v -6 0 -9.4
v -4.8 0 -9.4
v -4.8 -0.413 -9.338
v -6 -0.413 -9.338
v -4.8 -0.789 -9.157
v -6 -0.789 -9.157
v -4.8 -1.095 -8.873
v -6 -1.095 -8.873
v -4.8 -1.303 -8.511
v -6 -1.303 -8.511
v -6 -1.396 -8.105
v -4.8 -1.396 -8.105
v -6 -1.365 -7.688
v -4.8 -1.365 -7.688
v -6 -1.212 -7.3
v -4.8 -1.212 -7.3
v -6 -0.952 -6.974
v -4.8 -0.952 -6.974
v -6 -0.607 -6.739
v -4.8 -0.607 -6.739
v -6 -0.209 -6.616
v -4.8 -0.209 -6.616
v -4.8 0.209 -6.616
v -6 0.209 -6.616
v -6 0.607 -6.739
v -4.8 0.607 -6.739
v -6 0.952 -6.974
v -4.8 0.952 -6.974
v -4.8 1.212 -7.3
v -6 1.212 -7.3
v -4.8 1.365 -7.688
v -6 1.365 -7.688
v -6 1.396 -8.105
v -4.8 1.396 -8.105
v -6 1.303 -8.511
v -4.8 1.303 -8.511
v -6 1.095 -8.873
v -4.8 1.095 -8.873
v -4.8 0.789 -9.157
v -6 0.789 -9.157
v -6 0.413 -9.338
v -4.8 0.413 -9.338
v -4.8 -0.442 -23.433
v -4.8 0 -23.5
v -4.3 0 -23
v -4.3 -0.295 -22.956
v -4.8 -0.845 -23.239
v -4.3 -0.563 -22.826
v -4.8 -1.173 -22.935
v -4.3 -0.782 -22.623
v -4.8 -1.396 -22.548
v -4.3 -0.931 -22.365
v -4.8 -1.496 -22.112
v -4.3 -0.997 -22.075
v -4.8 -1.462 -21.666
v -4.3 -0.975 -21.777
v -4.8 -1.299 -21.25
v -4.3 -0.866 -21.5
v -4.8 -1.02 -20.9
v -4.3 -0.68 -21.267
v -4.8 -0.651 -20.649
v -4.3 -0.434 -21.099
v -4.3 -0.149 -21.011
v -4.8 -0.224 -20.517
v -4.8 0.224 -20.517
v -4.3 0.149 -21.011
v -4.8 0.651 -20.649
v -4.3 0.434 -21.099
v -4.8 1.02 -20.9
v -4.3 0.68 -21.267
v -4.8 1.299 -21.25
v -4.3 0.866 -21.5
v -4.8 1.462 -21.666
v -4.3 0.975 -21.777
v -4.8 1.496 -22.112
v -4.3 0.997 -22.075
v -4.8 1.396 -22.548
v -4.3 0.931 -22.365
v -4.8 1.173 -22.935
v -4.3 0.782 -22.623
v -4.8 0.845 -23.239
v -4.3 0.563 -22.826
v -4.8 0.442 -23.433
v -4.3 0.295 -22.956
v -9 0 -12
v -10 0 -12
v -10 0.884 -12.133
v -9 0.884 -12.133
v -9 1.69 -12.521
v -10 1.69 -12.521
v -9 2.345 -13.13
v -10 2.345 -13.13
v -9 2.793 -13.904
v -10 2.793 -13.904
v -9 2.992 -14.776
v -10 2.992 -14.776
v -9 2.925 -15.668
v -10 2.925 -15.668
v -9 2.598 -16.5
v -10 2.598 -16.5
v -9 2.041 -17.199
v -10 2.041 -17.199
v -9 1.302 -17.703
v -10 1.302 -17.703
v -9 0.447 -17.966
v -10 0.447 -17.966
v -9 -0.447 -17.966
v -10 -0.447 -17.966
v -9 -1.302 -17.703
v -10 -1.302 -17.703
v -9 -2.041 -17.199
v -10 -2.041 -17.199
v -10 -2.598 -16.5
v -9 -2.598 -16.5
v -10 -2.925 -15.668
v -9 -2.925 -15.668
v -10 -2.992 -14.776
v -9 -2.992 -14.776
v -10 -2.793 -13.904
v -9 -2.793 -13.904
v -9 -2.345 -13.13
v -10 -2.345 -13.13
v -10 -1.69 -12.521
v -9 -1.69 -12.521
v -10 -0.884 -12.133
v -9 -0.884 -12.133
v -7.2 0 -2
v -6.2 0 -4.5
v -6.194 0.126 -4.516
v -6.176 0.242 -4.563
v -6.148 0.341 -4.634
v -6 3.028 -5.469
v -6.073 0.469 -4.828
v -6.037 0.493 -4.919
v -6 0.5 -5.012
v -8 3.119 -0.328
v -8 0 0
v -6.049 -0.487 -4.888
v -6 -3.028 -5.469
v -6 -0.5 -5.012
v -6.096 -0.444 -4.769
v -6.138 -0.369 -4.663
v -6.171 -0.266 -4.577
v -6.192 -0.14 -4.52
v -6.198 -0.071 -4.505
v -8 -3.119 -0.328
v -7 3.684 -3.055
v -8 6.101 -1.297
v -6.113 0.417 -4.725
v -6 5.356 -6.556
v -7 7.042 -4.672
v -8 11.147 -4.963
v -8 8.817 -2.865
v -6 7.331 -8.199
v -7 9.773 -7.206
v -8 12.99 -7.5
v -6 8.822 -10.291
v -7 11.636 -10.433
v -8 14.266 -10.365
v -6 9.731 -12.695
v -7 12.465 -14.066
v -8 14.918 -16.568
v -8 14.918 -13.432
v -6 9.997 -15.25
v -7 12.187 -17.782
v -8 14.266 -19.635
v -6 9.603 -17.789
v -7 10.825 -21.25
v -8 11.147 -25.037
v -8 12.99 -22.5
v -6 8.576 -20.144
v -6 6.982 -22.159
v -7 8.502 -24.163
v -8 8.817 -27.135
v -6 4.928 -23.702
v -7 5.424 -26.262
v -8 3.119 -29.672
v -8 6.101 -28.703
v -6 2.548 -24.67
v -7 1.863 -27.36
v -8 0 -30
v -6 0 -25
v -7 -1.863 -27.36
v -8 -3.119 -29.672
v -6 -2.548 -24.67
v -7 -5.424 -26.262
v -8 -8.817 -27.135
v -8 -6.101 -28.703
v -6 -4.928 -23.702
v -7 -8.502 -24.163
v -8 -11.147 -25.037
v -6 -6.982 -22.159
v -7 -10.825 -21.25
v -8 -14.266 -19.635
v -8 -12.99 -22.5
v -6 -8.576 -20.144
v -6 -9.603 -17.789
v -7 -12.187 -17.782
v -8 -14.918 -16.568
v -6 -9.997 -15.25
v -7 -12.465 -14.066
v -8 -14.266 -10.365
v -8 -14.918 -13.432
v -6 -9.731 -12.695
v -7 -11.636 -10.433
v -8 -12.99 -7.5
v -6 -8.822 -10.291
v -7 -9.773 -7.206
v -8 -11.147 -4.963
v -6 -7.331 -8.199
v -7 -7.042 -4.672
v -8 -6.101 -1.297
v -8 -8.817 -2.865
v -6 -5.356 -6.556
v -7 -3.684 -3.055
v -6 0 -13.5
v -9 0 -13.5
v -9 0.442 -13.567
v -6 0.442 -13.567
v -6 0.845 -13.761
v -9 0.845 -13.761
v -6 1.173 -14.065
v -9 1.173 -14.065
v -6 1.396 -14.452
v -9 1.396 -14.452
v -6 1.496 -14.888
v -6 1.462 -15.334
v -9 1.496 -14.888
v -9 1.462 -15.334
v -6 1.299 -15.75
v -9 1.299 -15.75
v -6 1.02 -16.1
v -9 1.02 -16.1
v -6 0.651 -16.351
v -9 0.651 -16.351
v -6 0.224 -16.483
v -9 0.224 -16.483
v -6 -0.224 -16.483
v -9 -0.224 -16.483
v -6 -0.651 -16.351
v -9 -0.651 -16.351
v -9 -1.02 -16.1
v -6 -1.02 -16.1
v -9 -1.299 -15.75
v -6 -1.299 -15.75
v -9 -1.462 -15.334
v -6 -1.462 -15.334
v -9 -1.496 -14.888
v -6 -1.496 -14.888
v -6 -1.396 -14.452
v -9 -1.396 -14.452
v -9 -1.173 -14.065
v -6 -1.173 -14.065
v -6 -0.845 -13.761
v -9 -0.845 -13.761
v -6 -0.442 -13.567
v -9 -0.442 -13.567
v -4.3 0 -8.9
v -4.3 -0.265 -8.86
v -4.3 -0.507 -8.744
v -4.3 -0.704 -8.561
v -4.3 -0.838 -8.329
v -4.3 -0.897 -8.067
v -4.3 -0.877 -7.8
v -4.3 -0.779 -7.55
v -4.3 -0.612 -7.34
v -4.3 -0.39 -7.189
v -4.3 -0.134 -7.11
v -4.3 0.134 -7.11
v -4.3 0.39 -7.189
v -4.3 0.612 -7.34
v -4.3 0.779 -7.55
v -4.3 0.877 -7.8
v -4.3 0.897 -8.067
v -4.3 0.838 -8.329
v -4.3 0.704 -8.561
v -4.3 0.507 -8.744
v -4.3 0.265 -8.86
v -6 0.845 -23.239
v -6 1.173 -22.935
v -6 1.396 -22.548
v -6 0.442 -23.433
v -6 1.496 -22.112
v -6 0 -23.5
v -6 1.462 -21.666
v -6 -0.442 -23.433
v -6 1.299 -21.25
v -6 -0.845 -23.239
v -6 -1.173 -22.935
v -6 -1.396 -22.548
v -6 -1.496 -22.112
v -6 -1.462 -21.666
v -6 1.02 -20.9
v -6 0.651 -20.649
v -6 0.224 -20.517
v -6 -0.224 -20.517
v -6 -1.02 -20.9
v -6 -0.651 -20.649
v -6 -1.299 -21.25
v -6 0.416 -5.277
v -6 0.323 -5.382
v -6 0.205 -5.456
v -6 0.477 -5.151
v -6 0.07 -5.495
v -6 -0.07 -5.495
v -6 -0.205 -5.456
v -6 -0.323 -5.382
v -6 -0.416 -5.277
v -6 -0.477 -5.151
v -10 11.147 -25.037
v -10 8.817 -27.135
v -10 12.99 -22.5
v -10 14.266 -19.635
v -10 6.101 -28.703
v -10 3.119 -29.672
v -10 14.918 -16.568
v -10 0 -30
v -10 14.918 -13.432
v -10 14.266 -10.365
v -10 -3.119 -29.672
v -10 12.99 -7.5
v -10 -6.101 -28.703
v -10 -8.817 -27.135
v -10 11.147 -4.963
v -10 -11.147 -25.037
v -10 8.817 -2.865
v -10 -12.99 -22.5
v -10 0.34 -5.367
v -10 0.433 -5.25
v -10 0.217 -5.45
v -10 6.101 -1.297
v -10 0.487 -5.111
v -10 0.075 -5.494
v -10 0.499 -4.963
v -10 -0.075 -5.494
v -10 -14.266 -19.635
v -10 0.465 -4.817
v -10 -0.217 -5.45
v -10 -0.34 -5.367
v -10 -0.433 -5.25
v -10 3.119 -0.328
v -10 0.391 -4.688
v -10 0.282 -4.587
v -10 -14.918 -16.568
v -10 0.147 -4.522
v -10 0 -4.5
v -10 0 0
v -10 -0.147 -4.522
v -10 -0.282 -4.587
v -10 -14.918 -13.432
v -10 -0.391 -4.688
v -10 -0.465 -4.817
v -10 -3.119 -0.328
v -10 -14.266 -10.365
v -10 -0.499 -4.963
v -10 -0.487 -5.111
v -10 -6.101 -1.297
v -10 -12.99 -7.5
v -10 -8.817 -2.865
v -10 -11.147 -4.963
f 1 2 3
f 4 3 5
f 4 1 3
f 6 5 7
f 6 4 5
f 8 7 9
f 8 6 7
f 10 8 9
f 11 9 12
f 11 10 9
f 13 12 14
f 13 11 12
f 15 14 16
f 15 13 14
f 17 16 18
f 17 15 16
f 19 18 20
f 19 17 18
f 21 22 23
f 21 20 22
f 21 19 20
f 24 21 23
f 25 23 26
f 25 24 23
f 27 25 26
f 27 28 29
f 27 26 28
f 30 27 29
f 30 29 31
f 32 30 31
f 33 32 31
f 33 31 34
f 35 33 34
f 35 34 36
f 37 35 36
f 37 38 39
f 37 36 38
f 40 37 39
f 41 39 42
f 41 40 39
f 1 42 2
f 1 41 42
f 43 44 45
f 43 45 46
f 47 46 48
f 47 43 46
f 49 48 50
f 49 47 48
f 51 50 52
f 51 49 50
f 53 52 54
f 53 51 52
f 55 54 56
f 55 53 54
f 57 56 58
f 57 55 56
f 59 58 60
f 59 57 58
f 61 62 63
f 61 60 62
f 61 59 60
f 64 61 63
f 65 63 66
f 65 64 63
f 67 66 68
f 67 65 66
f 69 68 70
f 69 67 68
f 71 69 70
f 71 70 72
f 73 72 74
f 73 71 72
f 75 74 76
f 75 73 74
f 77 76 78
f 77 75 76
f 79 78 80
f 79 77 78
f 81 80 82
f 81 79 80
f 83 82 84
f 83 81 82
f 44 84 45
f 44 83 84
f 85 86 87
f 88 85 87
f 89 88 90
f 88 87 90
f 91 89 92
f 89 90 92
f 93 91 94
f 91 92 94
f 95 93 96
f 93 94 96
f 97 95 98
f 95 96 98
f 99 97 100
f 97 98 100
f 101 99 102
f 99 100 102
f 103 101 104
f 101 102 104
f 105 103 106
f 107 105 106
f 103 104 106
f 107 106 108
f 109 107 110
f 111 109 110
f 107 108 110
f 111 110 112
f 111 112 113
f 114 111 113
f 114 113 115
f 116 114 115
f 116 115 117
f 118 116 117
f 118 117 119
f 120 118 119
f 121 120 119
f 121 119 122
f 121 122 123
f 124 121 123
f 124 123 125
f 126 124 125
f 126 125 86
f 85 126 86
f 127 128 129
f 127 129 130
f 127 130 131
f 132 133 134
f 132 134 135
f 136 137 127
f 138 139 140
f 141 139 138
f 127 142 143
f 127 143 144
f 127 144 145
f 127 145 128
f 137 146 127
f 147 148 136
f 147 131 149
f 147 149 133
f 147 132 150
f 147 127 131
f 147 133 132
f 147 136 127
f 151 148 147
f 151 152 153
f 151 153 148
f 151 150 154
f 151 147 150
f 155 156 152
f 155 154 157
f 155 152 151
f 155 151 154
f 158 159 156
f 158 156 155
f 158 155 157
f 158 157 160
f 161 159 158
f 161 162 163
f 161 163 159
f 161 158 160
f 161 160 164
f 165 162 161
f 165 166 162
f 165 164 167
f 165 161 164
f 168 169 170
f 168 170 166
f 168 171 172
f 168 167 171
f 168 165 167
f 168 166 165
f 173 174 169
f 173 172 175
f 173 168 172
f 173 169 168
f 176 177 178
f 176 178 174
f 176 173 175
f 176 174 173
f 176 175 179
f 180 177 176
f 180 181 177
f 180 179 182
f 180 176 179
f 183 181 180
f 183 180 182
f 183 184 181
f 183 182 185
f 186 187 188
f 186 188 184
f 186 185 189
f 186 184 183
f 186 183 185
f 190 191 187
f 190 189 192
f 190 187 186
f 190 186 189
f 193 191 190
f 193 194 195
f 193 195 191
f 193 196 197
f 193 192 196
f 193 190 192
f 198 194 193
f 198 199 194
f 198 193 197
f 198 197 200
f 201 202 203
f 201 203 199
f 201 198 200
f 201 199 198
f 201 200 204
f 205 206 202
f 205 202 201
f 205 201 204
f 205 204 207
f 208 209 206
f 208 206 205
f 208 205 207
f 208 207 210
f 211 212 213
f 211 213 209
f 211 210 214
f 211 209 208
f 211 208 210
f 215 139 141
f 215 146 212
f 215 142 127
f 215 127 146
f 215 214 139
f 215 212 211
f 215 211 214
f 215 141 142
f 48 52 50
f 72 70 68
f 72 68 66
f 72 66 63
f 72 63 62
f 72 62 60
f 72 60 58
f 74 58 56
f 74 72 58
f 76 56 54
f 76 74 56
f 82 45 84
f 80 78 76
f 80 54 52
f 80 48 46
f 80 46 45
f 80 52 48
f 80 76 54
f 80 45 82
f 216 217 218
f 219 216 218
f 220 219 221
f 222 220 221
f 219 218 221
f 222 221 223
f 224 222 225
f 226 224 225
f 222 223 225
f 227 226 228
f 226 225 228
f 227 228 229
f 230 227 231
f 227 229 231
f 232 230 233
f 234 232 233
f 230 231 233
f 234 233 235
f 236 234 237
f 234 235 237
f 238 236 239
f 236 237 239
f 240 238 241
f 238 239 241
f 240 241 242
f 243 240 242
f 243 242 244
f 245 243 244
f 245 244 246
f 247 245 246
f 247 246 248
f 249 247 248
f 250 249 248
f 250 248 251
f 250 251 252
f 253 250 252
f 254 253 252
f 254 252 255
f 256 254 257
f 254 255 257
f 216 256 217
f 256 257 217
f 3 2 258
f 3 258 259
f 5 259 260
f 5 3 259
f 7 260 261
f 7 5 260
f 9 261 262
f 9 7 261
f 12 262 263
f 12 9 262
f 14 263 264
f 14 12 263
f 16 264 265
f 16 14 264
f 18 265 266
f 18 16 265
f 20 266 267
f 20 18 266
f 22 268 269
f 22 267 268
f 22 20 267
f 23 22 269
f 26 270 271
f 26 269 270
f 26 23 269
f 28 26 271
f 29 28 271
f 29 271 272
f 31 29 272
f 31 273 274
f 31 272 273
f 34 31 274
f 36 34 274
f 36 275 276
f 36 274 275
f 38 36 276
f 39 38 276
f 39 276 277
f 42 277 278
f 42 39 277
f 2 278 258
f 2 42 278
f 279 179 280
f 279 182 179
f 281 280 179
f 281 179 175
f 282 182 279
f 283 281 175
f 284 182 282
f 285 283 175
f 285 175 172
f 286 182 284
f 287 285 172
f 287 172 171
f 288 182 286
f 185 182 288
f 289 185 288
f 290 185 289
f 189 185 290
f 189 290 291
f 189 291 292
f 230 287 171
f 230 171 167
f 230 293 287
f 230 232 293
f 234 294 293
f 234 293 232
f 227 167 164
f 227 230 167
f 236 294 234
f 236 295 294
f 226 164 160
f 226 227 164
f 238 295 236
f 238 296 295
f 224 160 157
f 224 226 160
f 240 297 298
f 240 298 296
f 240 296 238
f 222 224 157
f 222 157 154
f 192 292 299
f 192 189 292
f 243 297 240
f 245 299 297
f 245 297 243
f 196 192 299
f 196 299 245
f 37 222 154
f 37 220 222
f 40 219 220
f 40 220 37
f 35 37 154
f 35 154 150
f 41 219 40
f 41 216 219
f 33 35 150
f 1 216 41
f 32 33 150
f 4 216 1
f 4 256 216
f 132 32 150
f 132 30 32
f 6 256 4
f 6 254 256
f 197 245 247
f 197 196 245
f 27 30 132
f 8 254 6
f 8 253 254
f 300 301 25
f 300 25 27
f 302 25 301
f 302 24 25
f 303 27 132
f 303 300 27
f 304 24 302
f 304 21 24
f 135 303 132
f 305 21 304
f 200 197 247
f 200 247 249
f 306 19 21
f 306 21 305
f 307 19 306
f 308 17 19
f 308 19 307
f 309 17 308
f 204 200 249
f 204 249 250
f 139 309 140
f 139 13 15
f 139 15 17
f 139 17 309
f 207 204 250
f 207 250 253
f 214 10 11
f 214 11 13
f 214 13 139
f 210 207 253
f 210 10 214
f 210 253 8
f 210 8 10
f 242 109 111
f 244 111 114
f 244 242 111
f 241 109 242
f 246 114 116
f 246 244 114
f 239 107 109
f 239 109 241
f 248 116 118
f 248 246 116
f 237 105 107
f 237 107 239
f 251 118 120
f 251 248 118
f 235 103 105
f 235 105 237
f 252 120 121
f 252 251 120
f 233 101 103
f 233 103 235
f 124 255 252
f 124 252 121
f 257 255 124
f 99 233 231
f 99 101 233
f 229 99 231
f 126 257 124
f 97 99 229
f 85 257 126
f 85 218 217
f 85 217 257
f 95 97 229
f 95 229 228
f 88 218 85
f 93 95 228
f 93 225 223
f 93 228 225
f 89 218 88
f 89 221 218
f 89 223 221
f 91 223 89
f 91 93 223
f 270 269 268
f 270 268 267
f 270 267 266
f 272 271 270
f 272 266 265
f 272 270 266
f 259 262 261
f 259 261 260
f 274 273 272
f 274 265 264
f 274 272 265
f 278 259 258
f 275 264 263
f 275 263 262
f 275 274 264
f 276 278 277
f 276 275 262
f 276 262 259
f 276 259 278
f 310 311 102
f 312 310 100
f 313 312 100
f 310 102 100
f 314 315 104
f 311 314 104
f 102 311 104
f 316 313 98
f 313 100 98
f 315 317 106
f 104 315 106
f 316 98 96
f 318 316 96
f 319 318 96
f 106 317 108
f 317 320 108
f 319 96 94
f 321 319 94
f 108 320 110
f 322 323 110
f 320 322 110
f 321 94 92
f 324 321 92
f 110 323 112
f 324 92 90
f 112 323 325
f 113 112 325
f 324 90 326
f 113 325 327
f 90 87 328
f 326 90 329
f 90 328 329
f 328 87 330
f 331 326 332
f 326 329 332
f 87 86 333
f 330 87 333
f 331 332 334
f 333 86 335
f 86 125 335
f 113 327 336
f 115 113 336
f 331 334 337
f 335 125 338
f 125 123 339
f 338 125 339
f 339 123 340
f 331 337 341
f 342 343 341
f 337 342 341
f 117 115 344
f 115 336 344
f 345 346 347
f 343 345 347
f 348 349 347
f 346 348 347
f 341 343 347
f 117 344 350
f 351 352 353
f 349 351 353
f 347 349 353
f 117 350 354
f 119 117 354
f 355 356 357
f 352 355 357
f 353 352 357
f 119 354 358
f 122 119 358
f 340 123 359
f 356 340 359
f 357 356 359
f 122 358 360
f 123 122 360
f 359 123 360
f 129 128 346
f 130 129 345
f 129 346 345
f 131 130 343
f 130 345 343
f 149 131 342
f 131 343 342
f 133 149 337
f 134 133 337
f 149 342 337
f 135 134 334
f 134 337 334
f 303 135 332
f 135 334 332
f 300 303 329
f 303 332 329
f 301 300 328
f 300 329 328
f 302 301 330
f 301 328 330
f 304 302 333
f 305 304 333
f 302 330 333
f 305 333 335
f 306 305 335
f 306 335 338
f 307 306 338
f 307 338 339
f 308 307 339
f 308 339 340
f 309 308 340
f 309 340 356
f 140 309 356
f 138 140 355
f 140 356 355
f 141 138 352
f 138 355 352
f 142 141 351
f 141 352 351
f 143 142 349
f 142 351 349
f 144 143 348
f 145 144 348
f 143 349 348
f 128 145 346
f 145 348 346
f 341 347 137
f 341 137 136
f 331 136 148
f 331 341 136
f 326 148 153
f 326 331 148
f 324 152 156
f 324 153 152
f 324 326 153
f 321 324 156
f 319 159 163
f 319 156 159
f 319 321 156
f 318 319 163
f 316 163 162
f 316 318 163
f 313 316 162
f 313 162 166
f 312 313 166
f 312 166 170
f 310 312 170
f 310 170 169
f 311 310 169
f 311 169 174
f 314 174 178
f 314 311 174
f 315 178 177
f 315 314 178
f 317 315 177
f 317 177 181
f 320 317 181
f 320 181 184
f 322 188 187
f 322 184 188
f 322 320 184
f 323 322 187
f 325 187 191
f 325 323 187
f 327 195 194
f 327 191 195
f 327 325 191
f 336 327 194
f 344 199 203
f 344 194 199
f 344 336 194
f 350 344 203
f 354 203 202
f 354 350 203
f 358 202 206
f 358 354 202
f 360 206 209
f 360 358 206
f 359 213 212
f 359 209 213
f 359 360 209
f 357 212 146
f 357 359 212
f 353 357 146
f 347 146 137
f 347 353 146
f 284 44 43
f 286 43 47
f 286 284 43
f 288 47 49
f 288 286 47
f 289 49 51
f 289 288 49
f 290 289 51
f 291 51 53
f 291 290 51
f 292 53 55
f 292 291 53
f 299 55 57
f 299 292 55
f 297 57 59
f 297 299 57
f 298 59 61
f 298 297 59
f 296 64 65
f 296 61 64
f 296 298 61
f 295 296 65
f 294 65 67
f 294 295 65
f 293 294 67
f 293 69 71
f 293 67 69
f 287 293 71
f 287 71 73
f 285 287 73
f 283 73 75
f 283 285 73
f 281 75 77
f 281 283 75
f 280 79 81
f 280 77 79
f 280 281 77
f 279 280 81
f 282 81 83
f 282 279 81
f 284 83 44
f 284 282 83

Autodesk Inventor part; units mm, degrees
ref_plane "YZ Plane" through (0, 0, 0) normal (1, 0, 0) x (0, 1, 0)
ref_plane "XZ Plane" through (0, 0, 0) normal (0, 1, 0) x (-1, 0, 0)
ref_plane "XY Plane" through (0, 0, 0) normal (0, 0, 1) x (1, 0, 0)
sketch "Náčrt1" plane through (0, 0, 0) normal (0, 1, 0) x (-1, 0, 0)
  line L0 (0, 0) -> (0, -15)
  line L1 (10, 0) -> (10, -15)
  line L2 (6, -5) -> (4, -5)
  line L3 (10, -15) -> (0, -15)
  line L4 (6, -5) -> (8, 0)
  line L5 (8, 0) -> (10, 0)
  line L6 (4, -5) -> (2, 0)
  line L7 (2, 0) -> (0, 0)
  dimension "d0" = 2
  dimension "d1" = 5
  dimension "d2" = 15
  dimension "d5" = 2
  dimension "d6" = 10
revolve "Rotace1" add sketch "Náčrt1" angle 360 about axis through (-10, 0, -15) along (1, 0, 0)
sketch "Náčrt2" plane through (0, 0, -15) normal (1, 0, 0) x (0, 0, -1)
  circle A0 centre (0, 0) radius 15 projected
  circle A1 centre (0, 0) radius 10 projected
  circle A2 centre (0, 0) radius 10.5
  point P0 (-15, 0)
  dimension "d8" = 21
extrude "Vysunutí1" cut sketch "Náčrt2" against normal blind 2.2 contours A1
sketch "Náčrt3" plane through (-10, 0, -15) normal (-1, 0, 0) x (0, 0, 1)
  circle A0 centre (0, 0) radius 15 projected
  circle A1 centre (0, 0) radius 3
  point P0 (15, 0)
  dimension "d11" = 6
extrude "Vysunutí2" cut sketch "Náčrt3" against normal blind 1 contours A1
sketch "Náčrt4" plane through (-9, 0, -15) normal (-1, 0, 0) x (0, 0, 1)
  circle A0 centre (0, 0) radius 15 projected
  circle A1 centre (0, 0) radius 10 projected
  circle A2 centre (0, 0) radius 1.5
  point P0 (15, 0)
  dimension "d14" = 3
extrude "Vysunutí3" cut sketch "Náčrt4" against normal through all contours A2
sketch "Náčrt5" plane through (-10, 0, -15) normal (-1, 0, 0) x (0, 0, 1)
  circle A0 centre (0, 0) radius 3 projected
  circle A1 centre (0, 0) radius 15 projected
  circle A2 centre (0, 0) radius 1.5 construction
  circle A3 centre (0, 0) radius 7 construction
  circle A4 centre (7, 0) radius 1.4
  circle A5 centre (0, 0) radius 10 construction
  circle A6 centre (10, 0) radius 0.5
  circle A7 centre (0, 0) radius 15 construction
  line L0 (0, 15) -> (0, -15) construction
  circle A8 centre (-7, 0) radius 1.4
  point P0 (15, 0)
  dimension "d17" = 8
  dimension "d18" = 2.8
  dimension "d21" = 5
  dimension "d22" = 1
extrude "Vysunutí4" cut sketch "Náčrt5" against normal through all contours A4 | A6 | A8
sketch "Náčrt6" plane through (-10, 0, -15) normal (-1, 0, 0) x (0, 0, 1)
  circle A0 centre (7, 0) radius 1.4 projected
  circle A1 centre (10, 0) radius 0.5 projected
  circle A2 centre (0, 0) radius 3 projected
  circle A3 centre (0, 0) radius 15 projected
  point P0 (15, 0)
ref_plane "Pracovní rovina1" through (-6, 0, -15) normal (-1, 0, 0) x (0, 0, 1)
split "Rozdělit1" plane through (-6, 0, -15) removes the side toward (1, 0, 0)
sketch "Náčrt7" plane through (-10, 0, -15) normal (-1, 0, 0) x (0, 0, 1)
  circle A0 centre (7, 0) radius 1.4 projected
  circle A1 centre (10, 0) radius 0.5 projected
  circle A2 centre (-7, 0) radius 1.4 projected
  circle A3 centre (0, 0) radius 3 projected
  circle A4 centre (0, 0) radius 15 projected
  circle A5 centre (-7, 0) radius 1.4 projected
  circle A6 centre (-7, 0) radius 1.5
  circle A7 centre (7, 0) radius 1.5
  point P0 (15, 0)
  dimension "d24" = 3
  dimension "d25" = 3
extrude "Vysunutí5" cut sketch "Náčrt7" against normal through all contours A0 | A2 | A6
sketch "Sketch8" plane through (-6, 0, -15) normal (1, 0, 0) x (0, 0, -1)
  circle A0 centre (7, 0) radius 1.5 projected
  circle A1 centre (-7, 0) radius 1.4 projected
  arc A2 (-9.9875, -0.4998) -> (-9.9875, 0.4998) centre (-10, 0) ccw projected
  arc A3 (-9.9875, -0.4998) -> (-9.9875, 0.4998) centre (0, 0) ccw projected
  circle A4 centre (0, 0) radius 1.5 projected
  circle A5 centre (-7, 0) radius 1.4
  circle A6 centre (7, 0) radius 1.5
  point P0 (-15, 0)
extrude "Extrusion6" add sketch "Sketch8" along normal blind 1.7 and the other way blind 4 contours A0 | A1
chamfer "Chamfer1" distance 0.5 angle 45 2 edges at (-4.3, 0, -6.6) (-4.3, 0, -20.5)
properties part number "bubinek_TOP"
